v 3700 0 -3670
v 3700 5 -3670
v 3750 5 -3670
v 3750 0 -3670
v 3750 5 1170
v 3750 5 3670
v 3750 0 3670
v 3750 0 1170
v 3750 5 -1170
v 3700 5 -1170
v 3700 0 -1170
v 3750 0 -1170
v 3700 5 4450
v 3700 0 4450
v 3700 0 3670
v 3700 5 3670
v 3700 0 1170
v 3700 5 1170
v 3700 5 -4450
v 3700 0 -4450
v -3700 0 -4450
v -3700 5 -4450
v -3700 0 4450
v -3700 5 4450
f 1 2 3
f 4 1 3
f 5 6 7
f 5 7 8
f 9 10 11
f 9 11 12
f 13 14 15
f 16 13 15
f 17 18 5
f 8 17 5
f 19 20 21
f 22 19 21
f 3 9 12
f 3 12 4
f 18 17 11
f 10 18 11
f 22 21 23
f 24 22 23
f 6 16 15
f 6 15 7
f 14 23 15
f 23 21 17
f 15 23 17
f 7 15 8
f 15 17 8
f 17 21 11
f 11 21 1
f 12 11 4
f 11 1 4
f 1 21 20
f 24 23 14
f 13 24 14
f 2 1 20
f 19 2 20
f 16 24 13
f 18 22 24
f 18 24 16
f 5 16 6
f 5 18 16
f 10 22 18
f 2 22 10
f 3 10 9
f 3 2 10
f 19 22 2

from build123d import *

# Parameters (mm, degrees)
BOSS_EXTRUDE1_DEPTH = 5
SKETCH2_W           = 50
SKETCH2_H           = 2500
BOSS_EXTRUDE2_DEPTH = 5


with BuildPart() as part:
    # Sketch1 → Boss-Extrude1 (new body)
    with BuildSketch(Plane(origin=(0, 0, 0), x_dir=(1, 0, 0), z_dir=(0, 1, 0))):
        Polygon((-3700, -4450), (3700, -4450), (3700, 4450), (3300, 4450), (3259.892103949, 4450), (2200, 4450), (2159.170676492, 4450), (-3700, 4450), align=None)
    extrude(amount=BOSS_EXTRUDE1_DEPTH)

    # Sketch2 → Boss-Extrude2 (add)
    with BuildSketch(Plane(origin=(0, 5, 0), x_dir=(1, 0, 0), z_dir=(0, 1, 0))):
        with Locations((3725, -2420)):
            Rectangle(SKETCH2_W, SKETCH2_H)
        with Locations((3725, 2420)):
            Rectangle(SKETCH2_W, SKETCH2_H)
    extrude(amount=-BOSS_EXTRUDE2_DEPTH)


solid = part.part
